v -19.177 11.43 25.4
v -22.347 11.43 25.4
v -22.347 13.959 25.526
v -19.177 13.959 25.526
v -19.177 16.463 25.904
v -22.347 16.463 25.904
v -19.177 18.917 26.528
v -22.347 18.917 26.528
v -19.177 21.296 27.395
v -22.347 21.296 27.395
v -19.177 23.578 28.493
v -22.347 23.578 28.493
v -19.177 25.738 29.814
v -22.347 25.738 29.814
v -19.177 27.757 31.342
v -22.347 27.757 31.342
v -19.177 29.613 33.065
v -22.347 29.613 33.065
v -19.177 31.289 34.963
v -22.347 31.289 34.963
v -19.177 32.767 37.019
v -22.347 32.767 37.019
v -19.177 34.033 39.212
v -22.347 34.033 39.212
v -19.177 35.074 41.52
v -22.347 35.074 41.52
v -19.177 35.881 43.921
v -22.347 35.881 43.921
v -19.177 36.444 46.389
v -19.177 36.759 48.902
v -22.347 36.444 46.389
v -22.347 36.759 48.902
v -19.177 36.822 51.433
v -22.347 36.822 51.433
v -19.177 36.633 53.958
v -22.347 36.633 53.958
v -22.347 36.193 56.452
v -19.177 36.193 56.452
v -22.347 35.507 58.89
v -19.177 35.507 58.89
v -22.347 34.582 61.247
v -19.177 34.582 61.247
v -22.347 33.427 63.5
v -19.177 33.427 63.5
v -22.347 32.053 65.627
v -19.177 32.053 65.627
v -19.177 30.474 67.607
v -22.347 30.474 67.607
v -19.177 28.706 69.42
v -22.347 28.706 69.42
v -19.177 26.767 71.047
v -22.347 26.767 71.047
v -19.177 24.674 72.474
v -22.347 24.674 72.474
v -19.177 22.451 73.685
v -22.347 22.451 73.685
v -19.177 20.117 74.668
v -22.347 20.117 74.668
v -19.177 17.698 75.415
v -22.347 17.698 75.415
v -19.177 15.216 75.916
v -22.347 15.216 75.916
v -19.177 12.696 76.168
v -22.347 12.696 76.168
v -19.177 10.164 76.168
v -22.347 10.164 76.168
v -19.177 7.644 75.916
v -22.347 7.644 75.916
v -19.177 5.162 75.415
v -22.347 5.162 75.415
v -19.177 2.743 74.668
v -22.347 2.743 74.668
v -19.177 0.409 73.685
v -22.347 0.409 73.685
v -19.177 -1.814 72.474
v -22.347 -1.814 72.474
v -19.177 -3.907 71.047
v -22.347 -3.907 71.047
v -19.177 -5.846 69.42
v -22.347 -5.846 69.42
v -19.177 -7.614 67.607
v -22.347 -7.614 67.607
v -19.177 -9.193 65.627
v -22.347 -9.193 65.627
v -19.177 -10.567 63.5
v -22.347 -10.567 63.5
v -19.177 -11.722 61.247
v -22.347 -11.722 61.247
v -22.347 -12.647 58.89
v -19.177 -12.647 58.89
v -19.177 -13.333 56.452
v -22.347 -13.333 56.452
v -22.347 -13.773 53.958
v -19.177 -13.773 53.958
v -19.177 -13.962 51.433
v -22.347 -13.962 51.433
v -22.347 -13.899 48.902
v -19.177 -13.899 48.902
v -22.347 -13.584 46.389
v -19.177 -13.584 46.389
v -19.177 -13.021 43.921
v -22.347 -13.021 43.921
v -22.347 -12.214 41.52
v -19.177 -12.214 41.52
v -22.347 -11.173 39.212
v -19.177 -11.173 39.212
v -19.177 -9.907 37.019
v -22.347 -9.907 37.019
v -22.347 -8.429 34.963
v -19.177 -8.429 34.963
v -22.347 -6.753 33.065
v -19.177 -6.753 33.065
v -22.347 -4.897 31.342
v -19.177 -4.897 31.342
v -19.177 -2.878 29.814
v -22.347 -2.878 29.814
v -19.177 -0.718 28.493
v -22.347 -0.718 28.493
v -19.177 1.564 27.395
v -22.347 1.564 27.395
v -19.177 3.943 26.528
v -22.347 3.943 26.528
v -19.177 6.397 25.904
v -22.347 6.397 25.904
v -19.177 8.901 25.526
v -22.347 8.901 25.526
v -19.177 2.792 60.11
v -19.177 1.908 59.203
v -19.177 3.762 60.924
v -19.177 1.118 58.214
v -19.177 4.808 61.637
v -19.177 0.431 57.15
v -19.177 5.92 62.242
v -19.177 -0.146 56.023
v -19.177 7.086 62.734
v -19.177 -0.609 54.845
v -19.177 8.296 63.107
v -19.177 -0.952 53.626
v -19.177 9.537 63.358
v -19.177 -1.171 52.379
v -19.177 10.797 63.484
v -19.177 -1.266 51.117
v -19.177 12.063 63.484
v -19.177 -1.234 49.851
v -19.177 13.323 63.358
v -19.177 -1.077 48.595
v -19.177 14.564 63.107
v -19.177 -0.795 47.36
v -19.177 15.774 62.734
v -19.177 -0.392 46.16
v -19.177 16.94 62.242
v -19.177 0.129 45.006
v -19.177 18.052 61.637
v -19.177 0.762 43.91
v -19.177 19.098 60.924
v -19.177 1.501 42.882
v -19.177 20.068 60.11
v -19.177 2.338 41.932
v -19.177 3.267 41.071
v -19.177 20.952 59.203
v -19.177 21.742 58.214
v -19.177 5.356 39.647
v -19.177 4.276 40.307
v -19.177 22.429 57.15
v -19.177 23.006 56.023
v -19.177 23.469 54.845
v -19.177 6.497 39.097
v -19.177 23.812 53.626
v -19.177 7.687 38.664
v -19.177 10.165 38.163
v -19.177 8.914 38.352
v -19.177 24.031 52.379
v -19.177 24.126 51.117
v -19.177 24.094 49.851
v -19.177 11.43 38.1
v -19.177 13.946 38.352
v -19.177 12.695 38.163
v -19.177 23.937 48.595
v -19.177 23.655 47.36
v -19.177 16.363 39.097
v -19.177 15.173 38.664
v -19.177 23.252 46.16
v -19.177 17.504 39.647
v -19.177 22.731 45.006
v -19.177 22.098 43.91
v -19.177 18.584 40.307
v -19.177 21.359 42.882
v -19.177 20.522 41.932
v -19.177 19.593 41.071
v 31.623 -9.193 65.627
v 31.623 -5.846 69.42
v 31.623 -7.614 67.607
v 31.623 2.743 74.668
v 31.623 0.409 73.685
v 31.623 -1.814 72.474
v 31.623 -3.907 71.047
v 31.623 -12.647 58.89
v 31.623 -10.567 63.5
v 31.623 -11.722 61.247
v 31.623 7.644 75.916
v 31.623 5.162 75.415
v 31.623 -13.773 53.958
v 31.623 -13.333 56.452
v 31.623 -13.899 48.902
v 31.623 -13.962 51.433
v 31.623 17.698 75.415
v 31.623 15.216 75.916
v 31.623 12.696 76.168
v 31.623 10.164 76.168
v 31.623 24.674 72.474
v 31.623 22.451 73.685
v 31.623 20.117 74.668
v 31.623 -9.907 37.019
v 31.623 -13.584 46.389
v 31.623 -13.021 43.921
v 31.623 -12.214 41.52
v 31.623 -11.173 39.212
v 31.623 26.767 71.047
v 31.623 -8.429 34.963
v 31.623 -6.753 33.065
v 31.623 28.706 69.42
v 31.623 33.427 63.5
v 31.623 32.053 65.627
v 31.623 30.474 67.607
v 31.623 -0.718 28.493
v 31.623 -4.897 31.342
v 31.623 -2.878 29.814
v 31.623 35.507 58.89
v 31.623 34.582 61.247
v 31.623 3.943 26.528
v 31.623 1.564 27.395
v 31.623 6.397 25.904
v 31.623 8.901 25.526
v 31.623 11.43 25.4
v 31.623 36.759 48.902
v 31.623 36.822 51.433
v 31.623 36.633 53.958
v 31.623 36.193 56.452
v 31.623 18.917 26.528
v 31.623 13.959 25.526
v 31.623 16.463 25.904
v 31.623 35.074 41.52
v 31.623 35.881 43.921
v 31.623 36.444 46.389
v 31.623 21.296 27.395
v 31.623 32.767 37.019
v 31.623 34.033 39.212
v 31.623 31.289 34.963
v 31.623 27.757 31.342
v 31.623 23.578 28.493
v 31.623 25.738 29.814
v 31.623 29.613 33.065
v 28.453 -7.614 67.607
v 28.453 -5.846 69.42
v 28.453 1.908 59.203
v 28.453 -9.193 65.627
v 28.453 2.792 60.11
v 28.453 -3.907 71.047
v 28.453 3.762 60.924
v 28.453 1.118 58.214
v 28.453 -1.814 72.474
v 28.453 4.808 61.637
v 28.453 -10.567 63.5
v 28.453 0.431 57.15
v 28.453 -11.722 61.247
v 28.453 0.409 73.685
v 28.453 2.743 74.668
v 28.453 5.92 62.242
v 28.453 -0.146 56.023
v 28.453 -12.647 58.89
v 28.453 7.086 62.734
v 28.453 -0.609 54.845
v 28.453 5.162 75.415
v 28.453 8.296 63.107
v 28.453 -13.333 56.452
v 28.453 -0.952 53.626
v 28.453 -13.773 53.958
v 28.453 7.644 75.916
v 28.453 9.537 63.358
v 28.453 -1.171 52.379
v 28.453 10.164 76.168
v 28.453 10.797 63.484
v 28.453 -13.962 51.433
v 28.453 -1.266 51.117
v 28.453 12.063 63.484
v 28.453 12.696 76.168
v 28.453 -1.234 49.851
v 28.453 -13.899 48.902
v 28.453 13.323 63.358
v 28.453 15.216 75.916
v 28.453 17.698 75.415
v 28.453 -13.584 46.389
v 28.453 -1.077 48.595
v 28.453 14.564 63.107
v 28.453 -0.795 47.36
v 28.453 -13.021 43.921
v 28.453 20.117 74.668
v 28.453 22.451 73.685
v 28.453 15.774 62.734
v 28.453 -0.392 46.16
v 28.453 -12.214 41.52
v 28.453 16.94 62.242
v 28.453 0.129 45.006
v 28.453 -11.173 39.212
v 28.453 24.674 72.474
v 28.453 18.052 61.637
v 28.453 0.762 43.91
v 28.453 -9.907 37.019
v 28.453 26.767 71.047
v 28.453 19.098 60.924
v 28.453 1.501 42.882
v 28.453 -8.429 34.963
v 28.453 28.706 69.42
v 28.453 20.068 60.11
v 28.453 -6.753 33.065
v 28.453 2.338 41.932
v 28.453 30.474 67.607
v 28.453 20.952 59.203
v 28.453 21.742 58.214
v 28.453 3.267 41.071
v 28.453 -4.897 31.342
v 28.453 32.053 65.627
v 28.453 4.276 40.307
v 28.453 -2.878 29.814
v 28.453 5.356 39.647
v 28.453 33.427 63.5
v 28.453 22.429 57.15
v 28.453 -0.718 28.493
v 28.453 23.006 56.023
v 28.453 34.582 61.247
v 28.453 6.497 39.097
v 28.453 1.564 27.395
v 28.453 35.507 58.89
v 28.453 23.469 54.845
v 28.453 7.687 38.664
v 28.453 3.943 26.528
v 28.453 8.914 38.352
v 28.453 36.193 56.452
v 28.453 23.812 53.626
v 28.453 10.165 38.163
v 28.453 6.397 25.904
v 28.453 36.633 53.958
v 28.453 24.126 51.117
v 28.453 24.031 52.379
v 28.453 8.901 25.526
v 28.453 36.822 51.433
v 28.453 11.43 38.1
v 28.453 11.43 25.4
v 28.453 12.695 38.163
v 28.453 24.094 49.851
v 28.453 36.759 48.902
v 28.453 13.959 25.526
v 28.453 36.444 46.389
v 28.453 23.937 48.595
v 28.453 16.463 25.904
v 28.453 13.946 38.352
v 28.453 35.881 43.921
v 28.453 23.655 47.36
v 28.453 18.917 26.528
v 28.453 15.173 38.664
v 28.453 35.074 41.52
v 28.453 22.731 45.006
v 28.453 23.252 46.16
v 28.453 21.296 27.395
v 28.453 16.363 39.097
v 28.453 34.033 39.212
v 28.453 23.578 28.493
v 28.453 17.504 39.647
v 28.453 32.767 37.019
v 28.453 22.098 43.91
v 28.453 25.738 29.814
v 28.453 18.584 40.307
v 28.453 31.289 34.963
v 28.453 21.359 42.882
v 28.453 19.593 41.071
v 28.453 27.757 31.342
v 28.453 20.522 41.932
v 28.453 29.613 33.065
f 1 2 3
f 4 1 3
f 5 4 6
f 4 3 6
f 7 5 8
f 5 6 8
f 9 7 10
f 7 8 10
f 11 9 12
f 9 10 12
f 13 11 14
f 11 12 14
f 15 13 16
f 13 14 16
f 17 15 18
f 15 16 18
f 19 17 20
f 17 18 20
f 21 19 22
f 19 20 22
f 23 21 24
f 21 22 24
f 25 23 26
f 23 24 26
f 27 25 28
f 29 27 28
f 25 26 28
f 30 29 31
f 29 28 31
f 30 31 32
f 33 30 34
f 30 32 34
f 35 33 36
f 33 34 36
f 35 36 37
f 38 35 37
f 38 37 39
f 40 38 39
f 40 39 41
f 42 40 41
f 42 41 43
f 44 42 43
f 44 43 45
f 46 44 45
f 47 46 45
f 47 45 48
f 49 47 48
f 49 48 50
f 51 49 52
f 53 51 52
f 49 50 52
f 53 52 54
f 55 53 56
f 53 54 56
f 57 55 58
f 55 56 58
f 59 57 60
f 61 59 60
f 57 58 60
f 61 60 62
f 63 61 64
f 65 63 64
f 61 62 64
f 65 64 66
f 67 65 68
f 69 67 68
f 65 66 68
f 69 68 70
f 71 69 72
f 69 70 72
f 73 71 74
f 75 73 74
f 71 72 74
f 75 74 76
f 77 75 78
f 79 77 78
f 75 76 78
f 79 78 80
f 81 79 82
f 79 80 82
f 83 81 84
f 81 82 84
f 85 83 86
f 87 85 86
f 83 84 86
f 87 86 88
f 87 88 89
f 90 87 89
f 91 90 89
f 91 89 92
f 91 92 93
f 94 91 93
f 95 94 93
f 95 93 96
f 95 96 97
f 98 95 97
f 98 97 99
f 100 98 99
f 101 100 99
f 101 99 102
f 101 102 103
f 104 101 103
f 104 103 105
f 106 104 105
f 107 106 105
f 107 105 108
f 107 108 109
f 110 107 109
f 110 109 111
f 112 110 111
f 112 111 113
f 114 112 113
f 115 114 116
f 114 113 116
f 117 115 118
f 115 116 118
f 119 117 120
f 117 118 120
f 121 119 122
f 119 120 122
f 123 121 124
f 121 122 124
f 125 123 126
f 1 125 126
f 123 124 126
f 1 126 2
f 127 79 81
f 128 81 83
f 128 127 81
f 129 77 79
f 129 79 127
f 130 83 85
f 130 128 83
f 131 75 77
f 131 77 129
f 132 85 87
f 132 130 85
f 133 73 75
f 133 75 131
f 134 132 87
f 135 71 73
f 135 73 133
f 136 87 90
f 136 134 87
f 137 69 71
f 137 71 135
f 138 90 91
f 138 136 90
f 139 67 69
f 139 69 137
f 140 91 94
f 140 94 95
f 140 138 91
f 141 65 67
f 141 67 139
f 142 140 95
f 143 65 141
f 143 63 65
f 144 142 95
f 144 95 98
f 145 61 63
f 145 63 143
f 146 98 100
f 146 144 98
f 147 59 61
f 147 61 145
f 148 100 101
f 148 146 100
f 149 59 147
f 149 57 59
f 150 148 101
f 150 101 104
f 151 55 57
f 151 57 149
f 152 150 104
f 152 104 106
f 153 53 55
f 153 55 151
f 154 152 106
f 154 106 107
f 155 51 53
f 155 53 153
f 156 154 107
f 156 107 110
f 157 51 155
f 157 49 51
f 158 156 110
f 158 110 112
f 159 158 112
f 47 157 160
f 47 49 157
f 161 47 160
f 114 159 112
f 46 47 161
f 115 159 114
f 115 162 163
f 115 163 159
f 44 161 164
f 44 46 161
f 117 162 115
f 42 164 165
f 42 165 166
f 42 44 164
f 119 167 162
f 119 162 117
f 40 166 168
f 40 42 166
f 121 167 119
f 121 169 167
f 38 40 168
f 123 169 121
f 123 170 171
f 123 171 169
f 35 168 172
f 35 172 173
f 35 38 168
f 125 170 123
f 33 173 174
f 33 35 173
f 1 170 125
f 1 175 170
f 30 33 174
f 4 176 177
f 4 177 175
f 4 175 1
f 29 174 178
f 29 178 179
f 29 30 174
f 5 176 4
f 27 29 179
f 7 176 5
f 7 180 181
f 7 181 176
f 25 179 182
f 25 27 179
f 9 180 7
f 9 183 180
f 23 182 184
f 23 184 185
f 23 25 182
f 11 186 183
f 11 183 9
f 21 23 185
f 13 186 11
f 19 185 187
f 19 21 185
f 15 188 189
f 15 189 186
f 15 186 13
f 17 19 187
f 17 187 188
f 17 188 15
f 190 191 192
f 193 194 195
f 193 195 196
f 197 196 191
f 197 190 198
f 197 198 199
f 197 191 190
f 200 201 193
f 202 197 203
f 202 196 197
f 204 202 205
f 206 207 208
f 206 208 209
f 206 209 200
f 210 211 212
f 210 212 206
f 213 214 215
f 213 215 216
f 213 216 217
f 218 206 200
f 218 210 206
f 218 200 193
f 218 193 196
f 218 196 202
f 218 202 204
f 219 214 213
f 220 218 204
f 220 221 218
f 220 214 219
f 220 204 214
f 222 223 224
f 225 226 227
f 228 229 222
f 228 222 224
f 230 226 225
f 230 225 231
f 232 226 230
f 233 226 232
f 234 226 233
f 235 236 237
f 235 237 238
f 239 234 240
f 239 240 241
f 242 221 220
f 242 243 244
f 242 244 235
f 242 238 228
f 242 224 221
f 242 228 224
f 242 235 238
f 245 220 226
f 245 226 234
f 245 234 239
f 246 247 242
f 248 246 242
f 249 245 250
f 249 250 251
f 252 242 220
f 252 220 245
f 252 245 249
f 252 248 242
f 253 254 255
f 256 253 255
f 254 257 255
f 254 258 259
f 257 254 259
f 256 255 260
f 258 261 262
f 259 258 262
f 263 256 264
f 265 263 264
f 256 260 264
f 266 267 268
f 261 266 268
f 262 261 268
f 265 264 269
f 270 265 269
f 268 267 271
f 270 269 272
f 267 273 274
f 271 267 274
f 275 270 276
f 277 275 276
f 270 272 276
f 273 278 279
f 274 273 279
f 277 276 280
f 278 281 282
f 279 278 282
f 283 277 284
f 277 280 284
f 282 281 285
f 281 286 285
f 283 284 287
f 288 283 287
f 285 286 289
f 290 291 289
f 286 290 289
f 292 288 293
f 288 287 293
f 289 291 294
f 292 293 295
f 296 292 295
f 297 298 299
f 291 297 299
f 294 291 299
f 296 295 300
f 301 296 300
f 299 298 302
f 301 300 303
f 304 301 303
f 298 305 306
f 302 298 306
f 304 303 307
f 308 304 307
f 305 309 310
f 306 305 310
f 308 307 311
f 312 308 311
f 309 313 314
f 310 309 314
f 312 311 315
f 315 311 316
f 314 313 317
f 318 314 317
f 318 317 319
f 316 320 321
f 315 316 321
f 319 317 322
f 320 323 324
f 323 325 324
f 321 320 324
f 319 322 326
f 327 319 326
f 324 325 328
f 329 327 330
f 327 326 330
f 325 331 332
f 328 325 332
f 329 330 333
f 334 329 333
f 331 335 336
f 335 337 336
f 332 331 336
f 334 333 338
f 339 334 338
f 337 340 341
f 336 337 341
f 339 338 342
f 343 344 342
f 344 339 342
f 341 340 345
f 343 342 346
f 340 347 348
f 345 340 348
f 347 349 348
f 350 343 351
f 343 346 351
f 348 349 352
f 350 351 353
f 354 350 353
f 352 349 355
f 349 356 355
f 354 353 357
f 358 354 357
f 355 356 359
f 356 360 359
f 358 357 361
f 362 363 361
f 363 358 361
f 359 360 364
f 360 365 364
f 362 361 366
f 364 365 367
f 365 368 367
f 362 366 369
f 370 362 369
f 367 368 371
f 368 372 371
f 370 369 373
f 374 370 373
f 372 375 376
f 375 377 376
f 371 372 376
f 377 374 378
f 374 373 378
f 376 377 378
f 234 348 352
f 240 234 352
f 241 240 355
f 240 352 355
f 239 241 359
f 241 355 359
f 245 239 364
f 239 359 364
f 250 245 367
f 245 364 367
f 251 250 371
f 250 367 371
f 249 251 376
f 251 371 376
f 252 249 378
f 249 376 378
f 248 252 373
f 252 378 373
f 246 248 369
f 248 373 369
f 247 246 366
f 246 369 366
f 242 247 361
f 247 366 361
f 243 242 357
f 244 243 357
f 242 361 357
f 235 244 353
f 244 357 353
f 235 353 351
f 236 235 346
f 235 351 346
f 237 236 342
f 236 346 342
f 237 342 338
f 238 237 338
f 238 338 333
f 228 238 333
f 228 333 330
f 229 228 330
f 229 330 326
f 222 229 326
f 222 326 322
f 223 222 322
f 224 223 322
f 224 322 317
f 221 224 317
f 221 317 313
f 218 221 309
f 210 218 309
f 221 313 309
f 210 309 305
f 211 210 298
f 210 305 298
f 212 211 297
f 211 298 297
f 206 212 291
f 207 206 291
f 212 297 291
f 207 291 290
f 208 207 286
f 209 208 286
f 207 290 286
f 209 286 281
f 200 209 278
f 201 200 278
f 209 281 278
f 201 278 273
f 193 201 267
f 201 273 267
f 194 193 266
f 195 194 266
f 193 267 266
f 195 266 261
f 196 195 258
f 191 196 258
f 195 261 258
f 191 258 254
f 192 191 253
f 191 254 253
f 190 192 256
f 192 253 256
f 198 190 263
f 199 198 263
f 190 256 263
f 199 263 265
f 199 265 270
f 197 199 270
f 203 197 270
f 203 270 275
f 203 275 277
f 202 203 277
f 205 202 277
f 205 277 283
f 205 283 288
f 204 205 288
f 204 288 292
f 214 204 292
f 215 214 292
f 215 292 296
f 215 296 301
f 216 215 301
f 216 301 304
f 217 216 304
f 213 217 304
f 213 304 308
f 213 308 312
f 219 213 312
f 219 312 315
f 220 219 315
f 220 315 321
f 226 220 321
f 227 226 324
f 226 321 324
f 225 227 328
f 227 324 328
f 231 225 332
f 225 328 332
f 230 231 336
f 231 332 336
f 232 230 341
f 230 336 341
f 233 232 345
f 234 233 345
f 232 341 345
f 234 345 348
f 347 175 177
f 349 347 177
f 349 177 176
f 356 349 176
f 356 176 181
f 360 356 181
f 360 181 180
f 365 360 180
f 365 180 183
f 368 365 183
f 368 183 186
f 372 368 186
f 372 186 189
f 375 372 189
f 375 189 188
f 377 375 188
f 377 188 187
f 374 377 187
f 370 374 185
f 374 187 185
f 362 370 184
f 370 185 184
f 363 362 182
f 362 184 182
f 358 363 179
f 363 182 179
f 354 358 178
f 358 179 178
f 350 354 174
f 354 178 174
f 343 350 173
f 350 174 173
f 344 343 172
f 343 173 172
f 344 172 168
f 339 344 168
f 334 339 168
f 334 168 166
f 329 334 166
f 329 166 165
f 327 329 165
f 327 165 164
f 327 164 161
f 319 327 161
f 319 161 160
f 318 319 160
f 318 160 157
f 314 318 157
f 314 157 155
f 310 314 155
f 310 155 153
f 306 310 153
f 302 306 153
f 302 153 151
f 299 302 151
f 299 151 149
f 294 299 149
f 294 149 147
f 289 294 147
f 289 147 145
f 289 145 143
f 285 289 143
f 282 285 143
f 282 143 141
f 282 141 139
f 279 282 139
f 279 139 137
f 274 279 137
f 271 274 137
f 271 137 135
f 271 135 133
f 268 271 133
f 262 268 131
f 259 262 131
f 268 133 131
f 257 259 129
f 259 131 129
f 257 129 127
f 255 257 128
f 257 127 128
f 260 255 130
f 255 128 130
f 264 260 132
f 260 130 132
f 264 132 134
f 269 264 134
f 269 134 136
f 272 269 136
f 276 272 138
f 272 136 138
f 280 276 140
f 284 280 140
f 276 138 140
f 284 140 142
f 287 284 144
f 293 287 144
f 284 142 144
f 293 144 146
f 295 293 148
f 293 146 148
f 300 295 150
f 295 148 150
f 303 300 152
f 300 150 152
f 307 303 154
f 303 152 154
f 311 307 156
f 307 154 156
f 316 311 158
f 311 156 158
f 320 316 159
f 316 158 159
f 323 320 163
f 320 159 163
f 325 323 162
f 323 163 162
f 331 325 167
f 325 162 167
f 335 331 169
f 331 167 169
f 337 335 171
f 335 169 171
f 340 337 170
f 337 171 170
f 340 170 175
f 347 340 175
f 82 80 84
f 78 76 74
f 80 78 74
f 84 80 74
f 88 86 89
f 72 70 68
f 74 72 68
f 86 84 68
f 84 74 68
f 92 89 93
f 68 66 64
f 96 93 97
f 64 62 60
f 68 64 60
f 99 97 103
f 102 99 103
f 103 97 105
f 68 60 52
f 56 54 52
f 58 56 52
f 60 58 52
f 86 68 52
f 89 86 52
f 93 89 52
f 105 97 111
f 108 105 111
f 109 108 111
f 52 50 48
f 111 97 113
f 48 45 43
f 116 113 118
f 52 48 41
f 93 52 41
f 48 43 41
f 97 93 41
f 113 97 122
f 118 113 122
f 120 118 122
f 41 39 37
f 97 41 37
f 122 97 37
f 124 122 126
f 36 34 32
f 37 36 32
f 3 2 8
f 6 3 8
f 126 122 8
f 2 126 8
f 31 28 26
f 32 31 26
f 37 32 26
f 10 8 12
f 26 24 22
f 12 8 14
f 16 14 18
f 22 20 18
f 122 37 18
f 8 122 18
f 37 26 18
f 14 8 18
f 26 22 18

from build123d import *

# Parameters (mm, degrees)
CYLINDER003_R      = 25.4
CYLINDER003_DEPTH  = 3.17
CYLINDER001_R      = 12.7
CYLINDER001_DEPTH  = 50.8
CYLINDER004_R      = 25.4
CYLINDER004_DEPTH  = 3.17
FUSION_PITCH_ANGLE = 90


with BuildPart() as cylinder003:
    # Cylinder003 → Cylinder003 (new body)
    with BuildSketch(Plane.XY):
        Circle(CYLINDER003_R)
    extrude(amount=CYLINDER003_DEPTH)


with BuildPart() as cylinder001:
    # Cylinder001 → Cylinder001 (new body)
    with BuildSketch(Plane.XY):
        Circle(CYLINDER001_R)
    extrude(amount=CYLINDER001_DEPTH)


with BuildPart() as fusion:
    # Cylinder004 → Cylinder004 (new body)
    with BuildSketch(Plane.XY.offset(50.8)):
        Circle(CYLINDER004_R)
    extrude(amount=CYLINDER004_DEPTH)

    # Fusion: union Cylinder003, Cylinder001
    add(cylinder003.part)
    add(cylinder001.part)


with BuildPart() as fusion_1:
    # Fusion pitch: moved
    add(fusion.part.rotate(Axis((0, 0, 0), (0, 1, 0)), FUSION_PITCH_ANGLE))


with BuildPart() as fusion_2:
    # Fusion placement: moved
    add(fusion_1.part.moved(Location((-22.347, 11.43, 50.8))))


solid = fusion_2.part
